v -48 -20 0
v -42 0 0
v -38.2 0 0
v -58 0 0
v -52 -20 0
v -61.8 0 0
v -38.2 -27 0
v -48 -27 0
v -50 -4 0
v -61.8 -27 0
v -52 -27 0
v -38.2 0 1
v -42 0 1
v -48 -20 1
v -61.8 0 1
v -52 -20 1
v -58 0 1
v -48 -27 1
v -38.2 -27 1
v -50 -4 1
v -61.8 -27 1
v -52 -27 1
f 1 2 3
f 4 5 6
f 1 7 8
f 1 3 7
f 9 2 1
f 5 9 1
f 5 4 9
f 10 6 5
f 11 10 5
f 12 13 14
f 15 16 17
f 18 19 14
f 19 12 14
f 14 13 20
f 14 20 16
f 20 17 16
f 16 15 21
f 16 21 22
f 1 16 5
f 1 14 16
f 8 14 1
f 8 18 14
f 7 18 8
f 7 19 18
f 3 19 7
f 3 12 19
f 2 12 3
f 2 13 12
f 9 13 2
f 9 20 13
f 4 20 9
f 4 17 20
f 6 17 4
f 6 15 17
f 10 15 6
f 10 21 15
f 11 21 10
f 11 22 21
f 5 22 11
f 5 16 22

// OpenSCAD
wid = 120;
len = 150;
hei = 50;

topnut = 1;

th = 2;

tubeth = 20;
wireth = 12;

topholes = 4;
topholeof = 16;

leftholes = 4;

wth = topnut ? 12 : 16;
whi = topnut ? 32 : 22;
wof = topnut ? 10 : 0;
win = topnut ? 4 : 0;
wof2 = topnut ? 10+((tubeth-wireth)/2)+1 : 0;

slitw = 24;

*translate([0,0,hei+0.1]) boxcover();
*rotate([180,0,0]) boxcover();
*junctionbox();

*translate([topholeof+38.25, len-7.1,whi-7]) rotate([-90,0,0]) slitclamp(14,6);
*translate([topholeof+38.25, len-17.1,whi-7]) rotate([-90,0,0]) slitclamp(18,4,2);

*translate([-20,-20,0]) slitclamp(14,6);
translate([-50,-20,0]) slitclamp(20,4,2);

module slitclamp(hi = 20, ind=4, slp=1.5, th=1.0)
{
    w = slitw-0.4;
    *color("#8af") translate([-w/2,0,0]) cube([w, hi, th]);

    color("#8af") linear_extrude(height=th) polygon([
        [-w/2,-7],[-2,-7],[-2,0],[2,0],[2,-7],[w/2,-7],
        [w/2,hi],[ind*slp,hi],[0,hi-ind],[-ind*slp,hi],[-w/2,hi]
    ]);
}

module boxcover()
{
    cof = th*sqrt(2);
    tol = th+0.2;
    difference() {
        union() {
            // base
            linear_extrude(height=th) polygon([
                [0,cof],[cof,0],[wid-cof,0],[wid,cof],[wid,len-cof],[wid-cof,len],[cof,len],[0,len-cof]
            ]);
            // Hinge/lip edge (bottom wall)
            translate([tol,tol,0]) rotate([0,90,0]) linear_extrude(height=wid-tol*2) polygon([
                [0,5],[5,0],[8,0],[8,2],[0,10]
            ]);
            // Top wall
            translate([0,len-th-tol,0]) rotate([-90,0,0]) linear_extrude(height=th) polygon([
                [tol,0],[wid-tol,0],[wid-tol,5],[tol,5]
            ]);

            // Left wall
            translate([tol,0,0]) rotate([0,90,0]) linear_extrude(height=th) polygon([
                [0,tol+5],[0,len-tol],[5,len-tol],[5,tol]
            ]);
            // Right wall
            translate([wid-tol-th,0,0]) rotate([0,90,0]) linear_extrude(height=th) polygon([
                [0,tol+5],[0,len-tol],[5,len-tol],[5,tol]
            ]);
            // Corner bevels
            translate([wid-cof*1.85,len-cof*0.85,-5]) rotate([0,0,225]) cube([th, th*2, 5]);
            translate([cof*0.85,len-cof*1.85,-5]) rotate([0,0,315]) cube([th, th*2, 5]);

            // Closing screw post
            translate([wid/2-5,len-tol,0]) rotate([0,90,0]) linear_extrude(height=10) polygon([
                [0,0],[5,0],[11,-0.5],[11,-6],[9,-8],[0,-10]
            ]);

            // Reinforcing ribs
            translate([0,len/3,-5]) linear_extrude(height=5) polygon([
                [3,-wid/3-1],[wid-3,wid/3-1],[wid-3,wid/3+1],[3,-wid/3+1]
            ]);
            translate([0,len*2/3,-5]) linear_extrude(height=5) polygon([
                [3,-wid/3-1],[wid-3,wid/3-1],[wid-3,wid/3+1],[3,-wid/3+1]
            ]);
            translate([0,len/3,-5]) linear_extrude(height=5) polygon([
                [3,wid/3-1],[wid-3,-wid/3-1],[wid-3,-wid/3+1],[3,wid/3+1]
            ]);
            translate([0,len*2/3,-5]) linear_extrude(height=5) polygon([
                [3,wid/3-1],[wid-3,-wid/3-1],[wid-3,-wid/3+1],[3,wid/3+1]
            ]);
            translate([wid/3-th,0,0]) rotate([0,90,0]) linear_extrude(height=th) polygon([
                [0,tol+5],[0,len-tol],[5,len-tol],[5,tol]
            ]);
            translate([wid*2/3,0,0]) rotate([0,90,0]) linear_extrude(height=th) polygon([
                [0,tol+5],[0,len-tol],[5,len-tol],[5,tol]
            ]);
        }
        // Corner bevels
        translate([cof,0,      -8.1]) rotate([0,0, 45]) translate([0,-2,0]) cube([4.7, th*2+4, 8.1]);
        translate([wid,cof,    -8.1]) rotate([0,0,135]) translate([0,-2,0]) cube([4.7, th*2+4, 8.1]);
        translate([wid-cof,len,-8.1]) rotate([0,0,225]) translate([0,-2,0]) cube([3.3, th*2+4, 8.1]);
        translate([0,len-cof,  -8.1]) rotate([0,0,315]) translate([0,-2,0]) cube([3.3, th*2+4, 8.1]);
        // Closing screw hole
        translate([wid/2,len,-7]) rotate([90,0,0]) cylinder(9,2,2,$fn=60);
    }
}

module junctionbox()
{
    thwid = wid-topholeof-th;
    lhwid = len-2*wth;
    cof = th*sqrt(2);
    difference() {
        union() {
            // Bottom/backside
            translate([th,th,0]) cube([wid-th*2, len-th*2, th]);
            // Left wall
            translate([0,cof,0]) cube([th, len-cof*2, hei]);
            // Right wall
            translate([wid-th,cof,0]) cube([th, len-cof*2, hei]);
            // Bottom wall
            translate([cof,0,0]) cube([wid-cof*2, th, hei]);
            // Top wall
            translate([cof,len-th,0]) cube([wid-cof*2, th, hei]);

            // Corner bevels
            translate([cof,0,0]) rotate([0,0,45]) cube([th, th*2, hei]);
            translate([wid,cof,0]) rotate([0,0,135]) cube([th, th*2, hei]);
            translate([wid-cof,len,0]) rotate([0,0,225]) cube([th, th*2, hei]);
            translate([0,len-cof,0]) rotate([0,0,315]) cube([th, th*2, hei]);

            // Top tube holder, bottom
            translate([topholeof,len-wth-th,0]) wireholder(thwid, wth, whi, topholes, tubeth);
            // Top wire holder, bottom
            translate([topholeof,len-wth-wth-th+win,0]) wireholder(thwid, wth-win, whi, topholes, wireth, wof2, slito=-2);

            // Left tube holder, bottom
            translate([wth+th,th,0]) rotate([0,0,90]) wireholder(lhwid, wth, whi, leftholes, tubeth);
            // Left wire holder, bottom
            translate([wth*2+th-win,th,0]) rotate([0,0,90]) wireholder(lhwid, wth-win, whi, leftholes, wireth, wof2, slito=-2);
            // Filler
            translate([th,len-wth-wth,0]) cube([topholeof-th, wth+wth-th, whi]);

            // Mounting hole filler
            translate([wid,0,0]) linear_extrude(height=whi, convexity=5) polygon([
                [-20,0],[-20,16],[-14,22],[0,22],[0,th*2],[-th*2,0]
            ]);

            /*
            // Left wall hinge/cover holder
            translate([th,th,hei]) rotate([-90,0,0]) linear_extrude(height=len-th*2) polygon([
                [0,0],[0,5],[5,0]
            ]);
            */
            // Bottom wall hinge/cover holder
            translate([th,th,hei]) rotate([0,90,0]) linear_extrude(height=wid-th*2) polygon([
                [0,0],[0,5],[5,0]
            ]);
        }
        // Top wall holes
        for (x = [(thwid/topholes)/2+topholeof:thwid/topholes:wid]) {
            translate([x,len-th-0.01,whi-tubeth/2-wof]) rotate([-90,0,0])
                cylinder(th+0.02, tubeth/2, tubeth/2, $fn=60);
        }
        // Left wall holes
        for (y = [(lhwid/leftholes)/2:lhwid/leftholes:lhwid]) {
            translate([-0.01, y+th, whi-tubeth/2-wof]) rotate([0,90,0])
                cylinder(th+0.02, tubeth/2, tubeth/2, $fn=60);
        }
        // Mounting holes
        //   Top left
        translate([10, len-12, -0.01]) cylinder(whi+0.02, 3, 3, $fn=60);
        translate([10, len-12, 10]) cylinder(whi-10+0.02, 6, 6, $fn=60);
        //   Bottom right
        translate([wid-10, 12, -0.01]) cylinder(whi+0.02, 3, 3, $fn=60);
        translate([wid-10, 12, 10]) cylinder(whi-10+0.02, 6, 6, $fn=60);

        // Closing screw hole
        translate([wid/2,len+0.01,hei-7]) rotate([90,0,0]) cylinder(th+0.02,1.7,1.7,$fn=60);
    }
    *for (x = [(thwid/topholes)/2+topholeof:thwid/topholes:wid]) {
        translate([x,len-th-12,whi-12-wof]) rotate([-90,0,0])
            cylinder(20, 16/2, 16/2, $fn=60);
    }
}

module wireholder(wid, len, hei, numwires, wiredia, wireof=wof, slitl=1.2, slith=0, slito=-4)
{
    if (topnut) {
        slitl = (slitl == 0) ? len/2 : slitl;
        slith = (slith == 0) ? wiredia*0.95+wireof : slith;
        // slitw = wiredia+4;
        difference() {
            cube([wid, len, hei]);
            for (x = [(wid/numwires)/2:wid/numwires:wid]) {
                // Hole
                translate([x,-0.01,hei-wiredia/2-wireof]) rotate([-90,0,0])
                    cylinder(len+0.02, wiredia/2,wiredia/2,$fn=60);
                // Holes for screwdown bit
                translate([x, len-slitl/2+slito, hei-slith]) cylinder(slith+0.01, 1.7, 1.7, $fn=60);
                // Slit for screwdown bit
                translate([x-slitw/2,len-slitl+slito,hei-slith]) cube([slitw, slitl+0.01, slith+10+0.01]);

                *#translate([x, len-slitl/2+slito, hei-8]) cylinder(8, 2, 2, $fn=60);
            }
        }
    } else {
        slitl = (slitl == 0) ? len/2 : slitl;
        slith = (slith == 0) ? hei/2 : slith;
        difference() {
            cube([wid, len, hei]);
            for (x = [(wid/numwires)/2:wid/numwires:wid]) {
                // Hole
                translate([x,-0.01,hei-wiredia/2]) rotate([-90,0,0])
                    cylinder(len+0.02, wiredia/2,wiredia/2,$fn=60);
                translate([x-wiredia/2,-0.01,hei-wiredia/2]) cube([wiredia, len+0.02, wiredia/2+0.01]);
                // Holes for screwdown bit
                translate([x-15, len-slitl/2+slito, 0]) cylinder(hei-wiredia/2+0.01, 2, 2, $fn=60);
                translate([x+15, len-slitl/2+slito, 0]) cylinder(hei-wiredia/2+0.01, 2, 2, $fn=60);
            }
            // Slit for screwdown bit
            translate([-0.01,len-slitl+slito,hei-slith]) cube([wid+0.02, slitl+0.01, slith+0.01]);
        }
    }
}
